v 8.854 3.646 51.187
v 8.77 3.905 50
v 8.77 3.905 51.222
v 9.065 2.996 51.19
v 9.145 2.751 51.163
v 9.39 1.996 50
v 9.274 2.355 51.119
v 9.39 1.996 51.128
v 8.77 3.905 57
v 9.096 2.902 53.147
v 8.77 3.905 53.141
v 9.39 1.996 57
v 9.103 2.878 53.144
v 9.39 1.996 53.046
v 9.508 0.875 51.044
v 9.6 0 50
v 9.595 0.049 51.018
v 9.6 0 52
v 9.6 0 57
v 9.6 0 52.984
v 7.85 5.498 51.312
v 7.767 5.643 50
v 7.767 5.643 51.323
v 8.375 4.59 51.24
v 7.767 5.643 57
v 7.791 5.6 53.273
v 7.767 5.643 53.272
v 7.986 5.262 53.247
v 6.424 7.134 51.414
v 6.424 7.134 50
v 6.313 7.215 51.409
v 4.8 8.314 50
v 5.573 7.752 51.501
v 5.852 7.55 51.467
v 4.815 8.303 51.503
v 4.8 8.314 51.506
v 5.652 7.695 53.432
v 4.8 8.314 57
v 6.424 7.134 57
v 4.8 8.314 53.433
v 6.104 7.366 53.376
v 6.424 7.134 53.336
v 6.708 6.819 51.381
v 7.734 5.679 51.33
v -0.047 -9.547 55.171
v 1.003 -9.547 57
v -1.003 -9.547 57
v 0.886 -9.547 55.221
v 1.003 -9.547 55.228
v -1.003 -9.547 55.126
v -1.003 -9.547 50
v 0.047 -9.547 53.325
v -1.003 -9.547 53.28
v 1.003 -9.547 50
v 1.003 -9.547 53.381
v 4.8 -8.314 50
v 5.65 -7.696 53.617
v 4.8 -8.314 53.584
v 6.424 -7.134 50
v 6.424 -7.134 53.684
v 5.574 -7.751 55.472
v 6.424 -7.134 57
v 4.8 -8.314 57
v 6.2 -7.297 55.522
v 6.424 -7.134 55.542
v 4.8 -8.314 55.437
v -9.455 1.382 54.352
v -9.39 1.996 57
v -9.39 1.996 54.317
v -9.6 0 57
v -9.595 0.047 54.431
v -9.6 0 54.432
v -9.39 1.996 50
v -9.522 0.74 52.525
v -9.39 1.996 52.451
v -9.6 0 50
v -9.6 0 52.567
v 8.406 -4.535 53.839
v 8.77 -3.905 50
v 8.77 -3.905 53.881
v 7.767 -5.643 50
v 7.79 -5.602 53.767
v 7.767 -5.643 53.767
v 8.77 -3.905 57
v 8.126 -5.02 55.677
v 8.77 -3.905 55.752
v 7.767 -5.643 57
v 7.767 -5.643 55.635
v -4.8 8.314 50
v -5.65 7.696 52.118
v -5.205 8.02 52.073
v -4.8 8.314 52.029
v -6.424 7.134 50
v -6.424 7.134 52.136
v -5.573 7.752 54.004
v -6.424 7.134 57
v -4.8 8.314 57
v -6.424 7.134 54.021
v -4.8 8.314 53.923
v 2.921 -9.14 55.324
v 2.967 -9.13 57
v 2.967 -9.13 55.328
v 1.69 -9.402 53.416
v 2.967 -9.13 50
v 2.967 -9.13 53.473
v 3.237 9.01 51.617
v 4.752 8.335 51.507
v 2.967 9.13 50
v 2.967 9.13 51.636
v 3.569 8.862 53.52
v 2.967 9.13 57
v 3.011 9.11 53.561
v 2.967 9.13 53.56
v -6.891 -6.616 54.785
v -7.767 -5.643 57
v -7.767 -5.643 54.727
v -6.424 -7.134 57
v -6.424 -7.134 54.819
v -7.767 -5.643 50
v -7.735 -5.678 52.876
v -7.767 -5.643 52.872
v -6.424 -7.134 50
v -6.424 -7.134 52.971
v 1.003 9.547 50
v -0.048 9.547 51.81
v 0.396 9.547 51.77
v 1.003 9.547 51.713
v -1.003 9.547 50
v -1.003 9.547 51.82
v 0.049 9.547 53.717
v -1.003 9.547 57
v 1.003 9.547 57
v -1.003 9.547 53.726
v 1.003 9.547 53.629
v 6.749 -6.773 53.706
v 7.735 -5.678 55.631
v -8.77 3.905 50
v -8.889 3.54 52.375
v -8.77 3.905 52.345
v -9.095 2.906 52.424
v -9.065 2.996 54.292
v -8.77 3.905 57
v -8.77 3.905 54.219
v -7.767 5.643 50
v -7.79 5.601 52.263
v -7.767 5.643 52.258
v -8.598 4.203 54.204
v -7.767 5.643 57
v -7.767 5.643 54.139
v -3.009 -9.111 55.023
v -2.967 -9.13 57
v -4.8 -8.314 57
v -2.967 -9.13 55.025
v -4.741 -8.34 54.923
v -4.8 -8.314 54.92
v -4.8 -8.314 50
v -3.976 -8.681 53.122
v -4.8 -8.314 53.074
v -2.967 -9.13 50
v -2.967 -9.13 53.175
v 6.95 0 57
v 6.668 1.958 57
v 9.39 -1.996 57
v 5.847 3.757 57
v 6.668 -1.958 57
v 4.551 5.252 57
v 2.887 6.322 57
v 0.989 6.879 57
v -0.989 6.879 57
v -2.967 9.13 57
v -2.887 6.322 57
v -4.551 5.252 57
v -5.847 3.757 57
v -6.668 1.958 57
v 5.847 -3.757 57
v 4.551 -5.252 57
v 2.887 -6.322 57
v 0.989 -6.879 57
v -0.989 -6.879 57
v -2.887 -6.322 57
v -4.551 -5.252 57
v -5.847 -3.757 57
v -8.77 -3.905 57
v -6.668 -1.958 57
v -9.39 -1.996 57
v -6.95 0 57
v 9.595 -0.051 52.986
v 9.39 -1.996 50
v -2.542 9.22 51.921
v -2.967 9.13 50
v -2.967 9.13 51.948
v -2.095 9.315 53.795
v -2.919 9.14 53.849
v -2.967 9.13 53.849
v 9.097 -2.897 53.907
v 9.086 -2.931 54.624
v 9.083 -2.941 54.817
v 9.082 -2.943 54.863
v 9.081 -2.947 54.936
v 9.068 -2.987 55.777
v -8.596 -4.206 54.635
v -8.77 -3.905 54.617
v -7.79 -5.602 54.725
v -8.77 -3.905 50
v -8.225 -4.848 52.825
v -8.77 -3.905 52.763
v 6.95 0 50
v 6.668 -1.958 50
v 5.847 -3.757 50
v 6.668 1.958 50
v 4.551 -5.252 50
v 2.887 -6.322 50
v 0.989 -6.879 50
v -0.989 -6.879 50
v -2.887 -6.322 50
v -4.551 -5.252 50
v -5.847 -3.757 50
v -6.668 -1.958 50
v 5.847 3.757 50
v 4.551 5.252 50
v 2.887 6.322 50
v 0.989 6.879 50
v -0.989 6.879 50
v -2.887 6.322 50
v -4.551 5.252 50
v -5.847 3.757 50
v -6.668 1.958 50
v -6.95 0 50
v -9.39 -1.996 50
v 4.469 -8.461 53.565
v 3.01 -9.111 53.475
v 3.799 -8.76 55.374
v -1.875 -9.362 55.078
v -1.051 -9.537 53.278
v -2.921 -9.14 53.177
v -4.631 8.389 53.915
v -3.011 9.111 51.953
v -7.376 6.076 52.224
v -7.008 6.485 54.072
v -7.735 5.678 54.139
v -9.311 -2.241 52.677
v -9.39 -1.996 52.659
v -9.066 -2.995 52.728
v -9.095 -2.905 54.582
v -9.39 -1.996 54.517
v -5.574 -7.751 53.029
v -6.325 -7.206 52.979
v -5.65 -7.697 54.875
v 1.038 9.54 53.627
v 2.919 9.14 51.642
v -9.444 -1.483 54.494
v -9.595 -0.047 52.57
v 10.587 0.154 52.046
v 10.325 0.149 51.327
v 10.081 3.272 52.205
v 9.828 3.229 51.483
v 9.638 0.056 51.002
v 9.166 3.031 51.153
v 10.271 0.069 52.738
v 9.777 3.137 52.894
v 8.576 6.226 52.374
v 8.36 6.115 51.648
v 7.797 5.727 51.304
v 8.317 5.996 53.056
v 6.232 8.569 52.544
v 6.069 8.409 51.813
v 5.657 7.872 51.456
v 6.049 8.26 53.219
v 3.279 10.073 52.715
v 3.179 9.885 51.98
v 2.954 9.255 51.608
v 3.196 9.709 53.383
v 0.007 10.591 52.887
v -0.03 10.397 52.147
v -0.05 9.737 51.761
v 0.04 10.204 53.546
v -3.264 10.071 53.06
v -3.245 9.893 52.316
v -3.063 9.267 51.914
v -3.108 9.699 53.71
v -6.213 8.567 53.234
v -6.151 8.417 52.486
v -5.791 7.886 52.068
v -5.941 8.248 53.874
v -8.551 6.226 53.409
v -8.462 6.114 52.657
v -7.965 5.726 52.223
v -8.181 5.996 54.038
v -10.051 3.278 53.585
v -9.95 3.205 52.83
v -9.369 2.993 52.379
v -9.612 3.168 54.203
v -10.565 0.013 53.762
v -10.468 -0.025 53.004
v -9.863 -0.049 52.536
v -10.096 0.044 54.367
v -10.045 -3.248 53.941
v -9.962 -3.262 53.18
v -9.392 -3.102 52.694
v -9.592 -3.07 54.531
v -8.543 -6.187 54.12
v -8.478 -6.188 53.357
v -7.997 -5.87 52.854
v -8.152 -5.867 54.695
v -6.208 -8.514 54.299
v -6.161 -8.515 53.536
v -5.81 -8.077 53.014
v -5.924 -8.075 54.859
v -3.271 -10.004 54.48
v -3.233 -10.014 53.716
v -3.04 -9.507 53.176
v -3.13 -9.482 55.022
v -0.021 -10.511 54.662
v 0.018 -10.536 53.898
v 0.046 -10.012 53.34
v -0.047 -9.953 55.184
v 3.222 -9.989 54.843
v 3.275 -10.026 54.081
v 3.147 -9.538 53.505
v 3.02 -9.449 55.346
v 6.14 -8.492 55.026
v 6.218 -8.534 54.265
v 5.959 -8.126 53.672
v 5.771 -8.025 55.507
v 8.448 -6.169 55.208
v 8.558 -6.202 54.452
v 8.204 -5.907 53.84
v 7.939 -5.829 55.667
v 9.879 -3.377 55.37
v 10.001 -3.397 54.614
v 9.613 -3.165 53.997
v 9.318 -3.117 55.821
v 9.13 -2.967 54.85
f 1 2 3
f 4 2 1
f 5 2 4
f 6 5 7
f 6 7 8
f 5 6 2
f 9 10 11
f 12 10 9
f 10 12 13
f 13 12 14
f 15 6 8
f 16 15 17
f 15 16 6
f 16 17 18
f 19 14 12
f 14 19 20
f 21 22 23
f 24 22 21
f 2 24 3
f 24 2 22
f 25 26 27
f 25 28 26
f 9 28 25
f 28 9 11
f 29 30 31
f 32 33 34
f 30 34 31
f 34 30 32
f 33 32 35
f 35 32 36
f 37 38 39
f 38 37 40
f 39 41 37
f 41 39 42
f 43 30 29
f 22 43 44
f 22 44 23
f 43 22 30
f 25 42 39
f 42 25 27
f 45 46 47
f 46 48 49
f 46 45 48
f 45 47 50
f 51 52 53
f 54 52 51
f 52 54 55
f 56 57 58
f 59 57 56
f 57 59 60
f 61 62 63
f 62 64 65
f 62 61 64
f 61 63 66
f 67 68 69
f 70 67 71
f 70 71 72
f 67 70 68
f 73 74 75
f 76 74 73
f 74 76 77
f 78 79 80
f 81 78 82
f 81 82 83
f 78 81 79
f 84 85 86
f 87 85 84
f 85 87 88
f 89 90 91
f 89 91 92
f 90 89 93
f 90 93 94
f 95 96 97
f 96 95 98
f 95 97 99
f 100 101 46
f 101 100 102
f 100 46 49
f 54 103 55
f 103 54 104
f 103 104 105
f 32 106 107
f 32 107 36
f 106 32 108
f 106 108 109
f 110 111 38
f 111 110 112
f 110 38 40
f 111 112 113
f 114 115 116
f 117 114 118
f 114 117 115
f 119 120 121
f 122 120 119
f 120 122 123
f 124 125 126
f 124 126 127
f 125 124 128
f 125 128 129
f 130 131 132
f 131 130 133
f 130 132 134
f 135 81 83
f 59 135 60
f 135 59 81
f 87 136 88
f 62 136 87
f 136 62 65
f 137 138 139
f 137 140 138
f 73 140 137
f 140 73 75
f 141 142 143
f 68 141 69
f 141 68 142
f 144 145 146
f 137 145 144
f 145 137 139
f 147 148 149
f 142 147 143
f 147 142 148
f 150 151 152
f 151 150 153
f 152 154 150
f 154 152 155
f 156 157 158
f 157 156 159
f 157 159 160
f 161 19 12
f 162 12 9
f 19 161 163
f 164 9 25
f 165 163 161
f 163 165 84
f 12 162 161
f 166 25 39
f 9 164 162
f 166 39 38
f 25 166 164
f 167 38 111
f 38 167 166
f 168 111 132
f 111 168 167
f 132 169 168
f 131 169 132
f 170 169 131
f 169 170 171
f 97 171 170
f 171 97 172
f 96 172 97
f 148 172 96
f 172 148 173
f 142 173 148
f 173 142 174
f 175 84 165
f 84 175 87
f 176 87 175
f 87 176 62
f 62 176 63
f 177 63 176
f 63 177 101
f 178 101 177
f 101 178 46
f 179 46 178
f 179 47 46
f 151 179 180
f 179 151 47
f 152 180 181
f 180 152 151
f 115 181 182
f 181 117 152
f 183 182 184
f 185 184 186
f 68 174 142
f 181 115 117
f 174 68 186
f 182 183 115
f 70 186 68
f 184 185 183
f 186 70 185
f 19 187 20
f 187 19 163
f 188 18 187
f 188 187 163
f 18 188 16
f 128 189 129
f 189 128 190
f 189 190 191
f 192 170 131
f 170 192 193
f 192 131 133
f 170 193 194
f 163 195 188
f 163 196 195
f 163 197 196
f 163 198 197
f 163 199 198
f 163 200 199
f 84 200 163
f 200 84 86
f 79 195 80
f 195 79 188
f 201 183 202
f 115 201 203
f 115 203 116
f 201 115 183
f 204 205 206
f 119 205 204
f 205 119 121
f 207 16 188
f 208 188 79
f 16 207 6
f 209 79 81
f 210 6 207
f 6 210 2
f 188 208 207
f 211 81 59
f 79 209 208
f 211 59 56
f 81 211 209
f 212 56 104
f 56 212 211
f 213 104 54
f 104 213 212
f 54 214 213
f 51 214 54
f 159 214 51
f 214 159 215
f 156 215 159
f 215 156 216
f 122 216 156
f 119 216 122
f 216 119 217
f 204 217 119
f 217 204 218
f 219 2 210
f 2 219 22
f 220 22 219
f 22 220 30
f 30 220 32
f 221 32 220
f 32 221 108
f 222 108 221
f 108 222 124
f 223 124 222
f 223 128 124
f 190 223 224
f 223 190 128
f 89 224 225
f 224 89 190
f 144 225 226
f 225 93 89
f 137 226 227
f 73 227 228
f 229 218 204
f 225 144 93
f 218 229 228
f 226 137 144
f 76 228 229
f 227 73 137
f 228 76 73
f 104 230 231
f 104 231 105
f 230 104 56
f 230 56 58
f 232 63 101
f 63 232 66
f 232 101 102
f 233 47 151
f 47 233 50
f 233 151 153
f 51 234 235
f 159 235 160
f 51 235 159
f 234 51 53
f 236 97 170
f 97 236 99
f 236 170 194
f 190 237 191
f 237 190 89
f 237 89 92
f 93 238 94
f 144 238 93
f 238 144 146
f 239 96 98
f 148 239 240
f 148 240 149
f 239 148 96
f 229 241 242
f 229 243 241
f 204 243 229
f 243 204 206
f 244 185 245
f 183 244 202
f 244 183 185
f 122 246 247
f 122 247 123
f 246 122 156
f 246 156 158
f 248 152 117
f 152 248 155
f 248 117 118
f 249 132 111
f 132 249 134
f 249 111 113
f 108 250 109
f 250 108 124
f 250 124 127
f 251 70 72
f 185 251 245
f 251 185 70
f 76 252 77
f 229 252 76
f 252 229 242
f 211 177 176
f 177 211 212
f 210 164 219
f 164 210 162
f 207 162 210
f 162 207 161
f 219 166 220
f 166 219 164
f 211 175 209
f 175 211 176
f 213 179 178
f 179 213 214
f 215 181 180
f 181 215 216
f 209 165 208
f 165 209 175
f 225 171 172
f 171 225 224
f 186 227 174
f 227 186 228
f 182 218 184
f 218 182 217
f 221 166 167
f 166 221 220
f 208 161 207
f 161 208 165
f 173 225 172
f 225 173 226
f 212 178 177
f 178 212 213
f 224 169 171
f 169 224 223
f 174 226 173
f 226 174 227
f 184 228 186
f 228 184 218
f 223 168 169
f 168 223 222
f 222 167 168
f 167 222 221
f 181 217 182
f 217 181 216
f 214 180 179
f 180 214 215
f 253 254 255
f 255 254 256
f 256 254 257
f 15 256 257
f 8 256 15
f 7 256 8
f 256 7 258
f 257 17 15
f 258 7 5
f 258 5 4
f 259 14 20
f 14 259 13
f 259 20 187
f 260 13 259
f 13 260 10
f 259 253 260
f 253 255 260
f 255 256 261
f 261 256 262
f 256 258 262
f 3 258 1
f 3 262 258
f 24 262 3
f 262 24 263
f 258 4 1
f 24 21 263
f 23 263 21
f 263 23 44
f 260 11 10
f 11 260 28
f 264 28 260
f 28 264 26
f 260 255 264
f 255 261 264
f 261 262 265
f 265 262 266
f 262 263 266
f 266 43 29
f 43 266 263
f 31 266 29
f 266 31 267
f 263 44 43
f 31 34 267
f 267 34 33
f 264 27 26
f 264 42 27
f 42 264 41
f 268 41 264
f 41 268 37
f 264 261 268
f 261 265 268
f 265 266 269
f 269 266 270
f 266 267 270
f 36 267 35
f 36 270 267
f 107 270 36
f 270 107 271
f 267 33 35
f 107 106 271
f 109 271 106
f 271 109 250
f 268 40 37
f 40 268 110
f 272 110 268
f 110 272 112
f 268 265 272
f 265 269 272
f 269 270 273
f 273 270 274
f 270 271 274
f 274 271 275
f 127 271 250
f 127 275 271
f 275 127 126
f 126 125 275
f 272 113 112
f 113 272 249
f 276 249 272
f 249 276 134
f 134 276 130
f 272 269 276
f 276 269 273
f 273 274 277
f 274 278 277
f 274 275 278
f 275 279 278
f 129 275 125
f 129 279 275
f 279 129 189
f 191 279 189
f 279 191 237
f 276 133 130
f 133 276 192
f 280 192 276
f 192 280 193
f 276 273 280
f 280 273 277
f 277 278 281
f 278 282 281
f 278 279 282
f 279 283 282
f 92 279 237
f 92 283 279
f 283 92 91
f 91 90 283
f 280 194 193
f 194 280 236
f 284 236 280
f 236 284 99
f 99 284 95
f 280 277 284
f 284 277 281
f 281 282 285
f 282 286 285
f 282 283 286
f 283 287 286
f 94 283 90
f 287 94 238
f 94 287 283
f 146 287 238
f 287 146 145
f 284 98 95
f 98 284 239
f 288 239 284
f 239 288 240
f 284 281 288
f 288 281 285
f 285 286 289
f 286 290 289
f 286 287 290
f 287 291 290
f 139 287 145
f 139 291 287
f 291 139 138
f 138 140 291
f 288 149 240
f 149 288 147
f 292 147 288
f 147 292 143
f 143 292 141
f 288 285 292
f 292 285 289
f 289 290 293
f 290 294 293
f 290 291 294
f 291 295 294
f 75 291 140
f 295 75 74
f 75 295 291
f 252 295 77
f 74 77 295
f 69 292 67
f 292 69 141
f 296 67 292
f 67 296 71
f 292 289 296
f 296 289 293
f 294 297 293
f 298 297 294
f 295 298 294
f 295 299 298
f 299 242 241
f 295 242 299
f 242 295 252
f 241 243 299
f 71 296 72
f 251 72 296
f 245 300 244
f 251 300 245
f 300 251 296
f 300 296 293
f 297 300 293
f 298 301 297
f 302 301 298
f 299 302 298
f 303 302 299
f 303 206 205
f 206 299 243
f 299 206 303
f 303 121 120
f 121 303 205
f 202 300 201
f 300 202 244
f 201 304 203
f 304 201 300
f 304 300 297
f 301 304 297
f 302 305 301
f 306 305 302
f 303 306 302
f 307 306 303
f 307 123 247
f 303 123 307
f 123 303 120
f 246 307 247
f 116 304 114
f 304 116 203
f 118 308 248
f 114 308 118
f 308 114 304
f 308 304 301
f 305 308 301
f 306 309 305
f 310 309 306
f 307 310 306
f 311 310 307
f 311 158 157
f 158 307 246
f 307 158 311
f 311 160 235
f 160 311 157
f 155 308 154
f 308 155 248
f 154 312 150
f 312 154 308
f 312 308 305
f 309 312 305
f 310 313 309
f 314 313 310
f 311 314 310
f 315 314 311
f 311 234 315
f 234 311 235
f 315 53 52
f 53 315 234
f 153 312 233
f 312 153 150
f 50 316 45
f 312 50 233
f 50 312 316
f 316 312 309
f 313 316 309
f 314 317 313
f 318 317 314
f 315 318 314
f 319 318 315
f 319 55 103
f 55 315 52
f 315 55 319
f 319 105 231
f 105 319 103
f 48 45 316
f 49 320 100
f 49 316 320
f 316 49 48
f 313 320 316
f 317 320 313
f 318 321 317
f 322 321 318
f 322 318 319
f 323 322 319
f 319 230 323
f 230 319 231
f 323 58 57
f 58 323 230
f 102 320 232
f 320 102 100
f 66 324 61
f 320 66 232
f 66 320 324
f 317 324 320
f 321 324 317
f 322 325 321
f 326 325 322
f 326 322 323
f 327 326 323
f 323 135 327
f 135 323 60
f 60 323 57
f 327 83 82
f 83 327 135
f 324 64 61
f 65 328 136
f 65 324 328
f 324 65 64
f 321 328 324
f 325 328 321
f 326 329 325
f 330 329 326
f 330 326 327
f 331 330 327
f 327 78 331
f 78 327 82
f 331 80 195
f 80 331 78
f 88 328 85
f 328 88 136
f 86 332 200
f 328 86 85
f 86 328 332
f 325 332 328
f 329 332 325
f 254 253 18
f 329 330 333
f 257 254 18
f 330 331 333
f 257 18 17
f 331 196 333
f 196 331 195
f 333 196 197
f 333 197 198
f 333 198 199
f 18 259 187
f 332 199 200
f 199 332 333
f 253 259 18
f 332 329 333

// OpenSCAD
union() {
	translate(v = [0, 0, 50]) {
		union() {
			difference() {
				cylinder(h = 7, r = 9.6000000000);
				cylinder(h = 7, r = 6.9500000000);
			}
			translate(v = [0, 0, 2]) {
				polyhedron(faces = [[0, 8, 1], [1, 8, 9], [1, 9, 2], [2, 9, 10], [2, 10, 3], [3, 10, 11], [3, 11, 4], [4, 11, 12], [4, 12, 5], [5, 12, 13], [5, 13, 6], [6, 13, 14], [6, 14, 7], [7, 14, 15], [7, 15, 0], [0, 15, 8], [8, 16, 9], [9, 16, 17], [9, 17, 10], [10, 17, 18], [10, 18, 11], [11, 18, 19], [11, 19, 12], [12, 19, 20], [12, 20, 13], [13, 20, 21], [13, 21, 14], [14, 21, 22], [14, 22, 15], [15, 22, 23], [15, 23, 8], [8, 23, 16], [16, 24, 17], [17, 24, 25], [17, 25, 18], [18, 25, 26], [18, 26, 19], [19, 26, 27], [19, 27, 20], [20, 27, 28], [20, 28, 21], [21, 28, 29], [21, 29, 22], [22, 29, 30], [22, 30, 23], [23, 30, 31], [23, 31, 16], [16, 31, 24], [24, 32, 25], [25, 32, 33], [25, 33, 26], [26, 33, 34], [26, 34, 27], [27, 34, 35], [27, 35, 28], [28, 35, 36], [28, 36, 29], [29, 36, 37], [29, 37, 30], [30, 37, 38], [30, 38, 31], [31, 38, 39], [31, 39, 24], [24, 39, 32], [32, 40, 33], [33, 40, 41], [33, 41, 34], [34, 41, 42], [34, 42, 35], [35, 42, 43], [35, 43, 36], [36, 43, 44], [36, 44, 37], [37, 44, 45], [37, 45, 38], [38, 45, 46], [38, 46, 39], [39, 46, 47], [39, 47, 32], [32, 47, 40], [40, 48, 41], [41, 48, 49], [41, 49, 42], [42, 49, 50], [42, 50, 43], [43, 50, 51], [43, 51, 44], [44, 51, 52], [44, 52, 45], [45, 52, 53], [45, 53, 46], [46, 53, 54], [46, 54, 47], [47, 54, 55], [47, 55, 40], [40, 55, 48], [48, 56, 49], [49, 56, 57], [49, 57, 50], [50, 57, 58], [50, 58, 51], [51, 58, 59], [51, 59, 52], [52, 59, 60], [52, 60, 53], [53, 60, 61], [53, 61, 54], [54, 61, 62], [54, 62, 55], [55, 62, 63], [55, 63, 48], [48, 63, 56], [56, 64, 57], [57, 64, 65], [57, 65, 58], [58, 65, 66], [58, 66, 59], [59, 66, 67], [59, 67, 60], [60, 67, 68], [60, 68, 61], [61, 68, 69], [61, 69, 62], [62, 69, 70], [62, 70, 63], [63, 70, 71], [63, 71, 56], [56, 71, 64], [64, 72, 65], [65, 72, 73], [65, 73, 66], [66, 73, 74], [66, 74, 67], [67, 74, 75], [67, 75, 68], [68, 75, 76], [68, 76, 69], [69, 76, 77], [69, 77, 70], [70, 77, 78], [70, 78, 71], [71, 78, 79], [71, 79, 64], [64, 79, 72], [72, 80, 73], [73, 80, 81], [73, 81, 74], [74, 81, 82], [74, 82, 75], [75, 82, 83], [75, 83, 76], [76, 83, 84], [76, 84, 77], [77, 84, 85], [77, 85, 78], [78, 85, 86], [78, 86, 79], [79, 86, 87], [79, 87, 72], [72, 87, 80], [80, 88, 81], [81, 88, 89], [81, 89, 82], [82, 89, 90], [82, 90, 83], [83, 90, 91], [83, 91, 84], [84, 91, 92], [84, 92, 85], [85, 92, 93], [85, 93, 86], [86, 93, 94], [86, 94, 87], [87, 94, 95], [87, 95, 80], [80, 95, 88], [88, 96, 89], [89, 96, 97], [89, 97, 90], [90, 97, 98], [90, 98, 91], [91, 98, 99], [91, 99, 92], [92, 99, 100], [92, 100, 93], [93, 100, 101], [93, 101, 94], [94, 101, 102], [94, 102, 95], [95, 102, 103], [95, 103, 88], [88, 103, 96], [96, 104, 97], [97, 104, 105], [97, 105, 98], [98, 105, 106], [98, 106, 99], [99, 106, 107], [99, 107, 100], [100, 107, 108], [100, 108, 101], [101, 108, 109], [101, 109, 102], [102, 109, 110], [102, 110, 103], [103, 110, 111], [103, 111, 96], [96, 111, 104], [104, 112, 105], [105, 112, 113], [105, 113, 106], [106, 113, 114], [106, 114, 107], [107, 114, 115], [107, 115, 108], [108, 115, 116], [108, 116, 109], [109, 116, 117], [109, 117, 110], [110, 117, 118], [110, 118, 111], [111, 118, 119], [111, 119, 104], [104, 119, 112], [112, 120, 113], [113, 120, 121], [113, 121, 114], [114, 121, 122], [114, 122, 115], [115, 122, 123], [115, 123, 116], [116, 123, 124], [116, 124, 117], [117, 124, 125], [117, 125, 118], [118, 125, 126], [118, 126, 119], [119, 126, 127], [119, 127, 112], [112, 127, 120], [120, 128, 121], [121, 128, 129], [121, 129, 122], [122, 129, 130], [122, 130, 123], [123, 130, 131], [123, 131, 124], [124, 131, 132], [124, 132, 125], [125, 132, 133], [125, 133, 126], [126, 133, 134], [126, 134, 127], [127, 134, 135], [127, 135, 120], [120, 135, 128], [128, 136, 129], [129, 136, 137], [129, 137, 130], [130, 137, 138], [130, 138, 131], [131, 138, 139], [131, 139, 132], [132, 139, 140], [132, 140, 133], [133, 140, 141], [133, 141, 134], [134, 141, 142], [134, 142, 135], [135, 142, 143], [135, 143, 128], [128, 143, 136], [136, 144, 137], [137, 144, 145], [137, 145, 138], [138, 145, 146], [138, 146, 139], [139, 146, 147], [139, 147, 140], [140, 147, 148], [140, 148, 141], [141, 148, 149], [141, 149, 142], [142, 149, 150], [142, 150, 143], [143, 150, 151], [143, 151, 136], [136, 151, 144], [144, 152, 145], [145, 152, 153], [145, 153, 146], [146, 153, 154], [146, 154, 147], [147, 154, 155], [147, 155, 148], [148, 155, 156], [148, 156, 149], [149, 156, 157], [149, 157, 150], [150, 157, 158], [150, 158, 151], [151, 158, 159], [151, 159, 144], [144, 159, 152], [1, 160, 0], [152, 161, 153], [2, 160, 1], [153, 161, 154], [3, 160, 2], [154, 161, 155], [4, 160, 3], [155, 161, 156], [5, 160, 4], [156, 161, 157], [6, 160, 5], [157, 161, 158], [7, 160, 6], [158, 161, 159], [0, 160, 7], [159, 161, 152]], points = [[10.5870002218, 0.1540004144, 0.0459829819], [10.3245575949, 0.1487860483, -0.6729628545], [9.6376789557, 0.0564148330, -0.9976961777], [8.9287284952, -0.0690034263, -0.7379926111], [8.6129997782, -0.1540004144, -0.0459829819], [8.8754424051, -0.1487860483, 0.6729628545], [9.5623210443, -0.0564148330, 0.9976961777], [10.2712715048, 0.0690034263, 0.7379926111], [10.0806324681, 3.2724969596, 0.2045291623], [9.8279400592, 3.2287311793, -0.5165932549], [9.1664873370, 3.0313909207, -0.8472343840], [8.4837443352, 2.7960754309, -0.5937091358], [8.1796526448, 2.6606293324, 0.0954708377], [8.4323450537, 2.7043951127, 0.8165932549], [9.0937977759, 2.9017353713, 1.1472343840], [9.7765407776, 3.1370508611, 0.8937091358], [8.5755657772, 6.2259091077, 0.3736660986], [8.3598781692, 6.1145689623, -0.3521910950], [7.7966346674, 5.7268368856, -0.6960035904], [7.2157756762, 5.2898410695, -0.4563706907], [6.9575605148, 5.0595677363, 0.2263339014], [7.1732481228, 5.1709078817, 0.9521910950], [7.7364916246, 5.5586399584, 1.2960035904], [8.3173506158, 5.9956357745, 1.0563706907], [6.2317633870, 8.5692221728, 0.5437447457], [6.0694935735, 8.4087211472, -0.1867991380], [5.6572363800, 7.8720526738, -0.5443147232], [5.2364864793, 7.2735898656, -0.3193742288], [5.0537134570, 6.9639041192, 0.3562552543], [5.2159832705, 7.1244051448, 1.0867991380], [5.6282404640, 7.6610736182, 1.4443147232], [6.0489903647, 8.2595364264, 1.2193742288], [3.2790523922, 10.0731021697, 0.7147938967], [3.1789063845, 9.8851743556, -0.0203525863], [2.9543725876, 9.2549591535, -0.3921049377], [2.7369798545, 8.5516280817, -0.1826956719], [2.6540738998, 8.1871829431, 0.4852061033], [2.7542199075, 8.3751107573, 1.2203525863], [2.9787537044, 9.0053259594, 1.5921049377], [3.1961464375, 9.7086570312, 1.3826956719], [0.0069190305, 10.5905692373, 0.8868382735], [-0.0304789705, 10.3973211081, 0.1472147289], [-0.0500228040, 9.7370130873, -0.2393053790], [-0.0402639574, 8.9964446582, -0.0463038133], [-0.0069190305, 8.6094307627, 0.6131617265], [0.0304789705, 8.8026788919, 1.3527852711], [0.0500228040, 9.4629869127, 1.7393053790], [0.0402639574, 10.2035553418, 1.5463038133], [-3.2639047235, 10.0714293632, 1.0598972600], [-3.2453213221, 9.8925087742, 0.3159694963], [-3.0634451618, 9.2670043943, -0.0858411192], [-2.8248168306, 8.5613282060, 0.0898406226], [-2.6692215685, 8.1888557497, 0.7401027400], [-2.6878049699, 8.3677763387, 1.4840305037], [-2.8696811302, 8.9932807186, 1.8858411192], [-3.1083094614, 9.6989569069, 1.7101593774], [-6.2129377446, 8.5672021536, 1.2339834557], [-6.1508905381, 8.4174551613, 0.4859778273], [-5.7911747137, 7.8864244541, 0.0683687382], [-5.3445069228, 7.2851806182, 0.2257859290], [-5.0725390994, 6.9659241384, 0.8660165443], [-5.1345863059, 7.1156711307, 1.6140221727], [-5.4943021303, 7.6467018379, 2.0316312618], [-5.9409699213, 8.2479456738, 1.8742140710], [-8.5514352072, 6.2260501696, 1.4091010585], [-8.4618465514, 6.1139728778, 0.6573038844], [-7.9649703064, 5.7258528328, 0.2234107345], [-7.3518698377, 5.2890454932, 0.3615903315], [-6.9816910848, 5.0594266744, 0.9908989415], [-7.0712797406, 5.1715039662, 1.7426961156], [-7.5681559856, 5.5596240112, 2.1765892655], [-8.1812564543, 5.9964313508, 2.0384096685], [-10.0507640148, 3.2781981019, 1.5852440960], [-9.9502476189, 3.2053857188, 0.8300082066], [-9.3693248000, 2.9926743116, 0.3793764574], [-8.6482922667, 2.7646673377, 0.4973228156], [-8.2095210981, 2.6549281901, 1.1147559040], [-8.3100374940, 2.7277405732, 1.8699917934], [-8.8909603129, 2.9404519804, 2.3206235426], [-9.6119928462, 3.1684589543, 2.2026771844], [-10.5648694599, 0.0132676028, 1.7623945428], [-10.4680437311, -0.0250721587, 1.0041457192], [-9.8627297573, -0.0487249897, 0.5363616083], [-9.1035122550, -0.0438353825, 0.6330637980], [-8.6351305401, -0.0132676028, 1.2376054572], [-8.7319562689, 0.0250721587, 1.9958542808], [-9.3372702427, 0.0487249897, 2.4636383917], [-10.0964877450, 0.0438353825, 2.3669362020], [-10.0446110027, -3.2482462433, 1.9405203837], [-9.9618362433, -3.2617972511, 1.1797634271], [-9.3918666018, -3.1024041242, 0.6944646774], [-8.6685825641, -2.8634371946, 0.7689055603], [-8.2156741101, -2.6848800487, 1.3594796163], [-8.2984488696, -2.6713290409, 2.1202365729], [-8.8684185111, -2.8307221678, 2.6055353226], [-9.5917025487, -3.0696890974, 2.5310944397], [-8.5425428613, -6.1865473294, 2.1195737061], [-8.4784277464, -6.1876322149, 1.3568978164], [-7.9973120032, -5.8695257065, 0.8537851764], [-7.3810267089, -5.4185702827, 0.9049523471], [-6.9905834307, -5.0989295146, 1.4804262939], [-7.0546985456, -5.0978446291, 2.2431021836], [-7.5358142888, -5.4159511375, 2.7462148236], [-8.1520995831, -5.8669065613, 2.6950476529], [-6.2076567309, -8.5140421025, 2.2994889324], [-6.1605765290, -8.5149568532, 1.5355720158], [-5.8101537870, -8.0774727202, 1.0144213918], [-5.3616613948, -7.4578619754, 1.0413200277], [-5.0778201131, -7.0190841895, 1.6005110676], [-5.1249003151, -7.0181694388, 2.3644279842], [-5.4753230570, -7.4556535718, 2.8855786082], [-5.9238154492, -8.0752643166, 2.8586799723], [-3.2705973911, -10.0036557695, 2.4801813310], [-3.2333228960, -10.0140113650, 1.7157928098], [-3.0397841572, -9.5066085998, 1.1764676499], [-2.8033535431, -8.7786771322, 1.1781352154], [-2.6625289009, -8.2566293434, 1.7198186690], [-2.6998033960, -8.2462737479, 2.4842071902], [-2.8933421348, -8.7536765130, 3.0235323501], [-3.1297727489, -9.4816079807, 3.0218647846], [-0.0208092299, -10.5111514125, 2.6615459627], [0.0178212473, -10.5356600509, 1.8975476312], [0.0460122794, -10.0120717212, 1.3400111173], [0.0472499423, -9.2470973659, 1.3155337492], [0.0208092299, -8.6888485875, 1.8384540373], [-0.0178212473, -8.6643399491, 2.6024523688], [-0.0460122794, -9.1879282788, 3.1599888827], [-0.0472499423, -9.9529026341, 3.1844662508], [3.2221216823, -9.9892324890, 2.8434572384], [3.2747222192, -10.0263291643, 2.0808017082], [3.1468073504, -9.5384518791, 1.5051282082], [2.9133078712, -8.8113925304, 1.4536584673], [2.7110046097, -8.2710526239, 1.9565427616], [2.6584040728, -8.2339559486, 2.7191982918], [2.7863189416, -8.7218332337, 3.2948717918], [3.0198184208, -9.4488925825, 3.3463415327], [6.1400811791, -8.4920242379, 3.0257692573], [6.2178080038, -8.5336043496, 2.2654955745], [5.9586668667, -8.1258621272, 1.6718807257], [5.5144591315, -7.5076474345, 1.5926562383], [5.1453956649, -7.0411020541, 2.0742307427], [5.0676688403, -6.9995219424, 2.8345044255], [5.3268099773, -7.4072641648, 3.4281192743], [5.7710177125, -8.0254788575, 3.5073437617], [8.4478464855, -6.1694895591, 3.2083170772], [8.5575301263, -6.2018810203, 2.4515431811], [8.2038760375, -5.9067343307, 1.8403119199], [7.5940499878, -5.4569424183, 1.7326742765], [7.0852798065, -5.1159872849, 2.1916829228], [6.9755961657, -5.0835958237, 2.9484568189], [7.3292502545, -5.3787425133, 3.5596880801], [7.9390763041, -5.8285344258, 3.6673257235], [9.8792118783, -3.3773649268, 3.3697471000], [10.0013555849, -3.3972658345, 2.6144515907], [9.6131545152, -3.1648669486, 1.9971371449], [8.9420115908, -2.8163043846, 1.8794181928], [8.3810732346, -2.5557613652, 2.3302529000], [8.2589295280, -2.5358604575, 3.0855484093], [8.6471305977, -2.7682593434, 3.7028628551], [9.3182735220, -3.1168219074, 3.8205818072], [9.6000000000, -0.0000000000, 0.0000000000], [9.1301425564, -2.9665631460, 2.8500000000]]);
			}
		}
	}
}
